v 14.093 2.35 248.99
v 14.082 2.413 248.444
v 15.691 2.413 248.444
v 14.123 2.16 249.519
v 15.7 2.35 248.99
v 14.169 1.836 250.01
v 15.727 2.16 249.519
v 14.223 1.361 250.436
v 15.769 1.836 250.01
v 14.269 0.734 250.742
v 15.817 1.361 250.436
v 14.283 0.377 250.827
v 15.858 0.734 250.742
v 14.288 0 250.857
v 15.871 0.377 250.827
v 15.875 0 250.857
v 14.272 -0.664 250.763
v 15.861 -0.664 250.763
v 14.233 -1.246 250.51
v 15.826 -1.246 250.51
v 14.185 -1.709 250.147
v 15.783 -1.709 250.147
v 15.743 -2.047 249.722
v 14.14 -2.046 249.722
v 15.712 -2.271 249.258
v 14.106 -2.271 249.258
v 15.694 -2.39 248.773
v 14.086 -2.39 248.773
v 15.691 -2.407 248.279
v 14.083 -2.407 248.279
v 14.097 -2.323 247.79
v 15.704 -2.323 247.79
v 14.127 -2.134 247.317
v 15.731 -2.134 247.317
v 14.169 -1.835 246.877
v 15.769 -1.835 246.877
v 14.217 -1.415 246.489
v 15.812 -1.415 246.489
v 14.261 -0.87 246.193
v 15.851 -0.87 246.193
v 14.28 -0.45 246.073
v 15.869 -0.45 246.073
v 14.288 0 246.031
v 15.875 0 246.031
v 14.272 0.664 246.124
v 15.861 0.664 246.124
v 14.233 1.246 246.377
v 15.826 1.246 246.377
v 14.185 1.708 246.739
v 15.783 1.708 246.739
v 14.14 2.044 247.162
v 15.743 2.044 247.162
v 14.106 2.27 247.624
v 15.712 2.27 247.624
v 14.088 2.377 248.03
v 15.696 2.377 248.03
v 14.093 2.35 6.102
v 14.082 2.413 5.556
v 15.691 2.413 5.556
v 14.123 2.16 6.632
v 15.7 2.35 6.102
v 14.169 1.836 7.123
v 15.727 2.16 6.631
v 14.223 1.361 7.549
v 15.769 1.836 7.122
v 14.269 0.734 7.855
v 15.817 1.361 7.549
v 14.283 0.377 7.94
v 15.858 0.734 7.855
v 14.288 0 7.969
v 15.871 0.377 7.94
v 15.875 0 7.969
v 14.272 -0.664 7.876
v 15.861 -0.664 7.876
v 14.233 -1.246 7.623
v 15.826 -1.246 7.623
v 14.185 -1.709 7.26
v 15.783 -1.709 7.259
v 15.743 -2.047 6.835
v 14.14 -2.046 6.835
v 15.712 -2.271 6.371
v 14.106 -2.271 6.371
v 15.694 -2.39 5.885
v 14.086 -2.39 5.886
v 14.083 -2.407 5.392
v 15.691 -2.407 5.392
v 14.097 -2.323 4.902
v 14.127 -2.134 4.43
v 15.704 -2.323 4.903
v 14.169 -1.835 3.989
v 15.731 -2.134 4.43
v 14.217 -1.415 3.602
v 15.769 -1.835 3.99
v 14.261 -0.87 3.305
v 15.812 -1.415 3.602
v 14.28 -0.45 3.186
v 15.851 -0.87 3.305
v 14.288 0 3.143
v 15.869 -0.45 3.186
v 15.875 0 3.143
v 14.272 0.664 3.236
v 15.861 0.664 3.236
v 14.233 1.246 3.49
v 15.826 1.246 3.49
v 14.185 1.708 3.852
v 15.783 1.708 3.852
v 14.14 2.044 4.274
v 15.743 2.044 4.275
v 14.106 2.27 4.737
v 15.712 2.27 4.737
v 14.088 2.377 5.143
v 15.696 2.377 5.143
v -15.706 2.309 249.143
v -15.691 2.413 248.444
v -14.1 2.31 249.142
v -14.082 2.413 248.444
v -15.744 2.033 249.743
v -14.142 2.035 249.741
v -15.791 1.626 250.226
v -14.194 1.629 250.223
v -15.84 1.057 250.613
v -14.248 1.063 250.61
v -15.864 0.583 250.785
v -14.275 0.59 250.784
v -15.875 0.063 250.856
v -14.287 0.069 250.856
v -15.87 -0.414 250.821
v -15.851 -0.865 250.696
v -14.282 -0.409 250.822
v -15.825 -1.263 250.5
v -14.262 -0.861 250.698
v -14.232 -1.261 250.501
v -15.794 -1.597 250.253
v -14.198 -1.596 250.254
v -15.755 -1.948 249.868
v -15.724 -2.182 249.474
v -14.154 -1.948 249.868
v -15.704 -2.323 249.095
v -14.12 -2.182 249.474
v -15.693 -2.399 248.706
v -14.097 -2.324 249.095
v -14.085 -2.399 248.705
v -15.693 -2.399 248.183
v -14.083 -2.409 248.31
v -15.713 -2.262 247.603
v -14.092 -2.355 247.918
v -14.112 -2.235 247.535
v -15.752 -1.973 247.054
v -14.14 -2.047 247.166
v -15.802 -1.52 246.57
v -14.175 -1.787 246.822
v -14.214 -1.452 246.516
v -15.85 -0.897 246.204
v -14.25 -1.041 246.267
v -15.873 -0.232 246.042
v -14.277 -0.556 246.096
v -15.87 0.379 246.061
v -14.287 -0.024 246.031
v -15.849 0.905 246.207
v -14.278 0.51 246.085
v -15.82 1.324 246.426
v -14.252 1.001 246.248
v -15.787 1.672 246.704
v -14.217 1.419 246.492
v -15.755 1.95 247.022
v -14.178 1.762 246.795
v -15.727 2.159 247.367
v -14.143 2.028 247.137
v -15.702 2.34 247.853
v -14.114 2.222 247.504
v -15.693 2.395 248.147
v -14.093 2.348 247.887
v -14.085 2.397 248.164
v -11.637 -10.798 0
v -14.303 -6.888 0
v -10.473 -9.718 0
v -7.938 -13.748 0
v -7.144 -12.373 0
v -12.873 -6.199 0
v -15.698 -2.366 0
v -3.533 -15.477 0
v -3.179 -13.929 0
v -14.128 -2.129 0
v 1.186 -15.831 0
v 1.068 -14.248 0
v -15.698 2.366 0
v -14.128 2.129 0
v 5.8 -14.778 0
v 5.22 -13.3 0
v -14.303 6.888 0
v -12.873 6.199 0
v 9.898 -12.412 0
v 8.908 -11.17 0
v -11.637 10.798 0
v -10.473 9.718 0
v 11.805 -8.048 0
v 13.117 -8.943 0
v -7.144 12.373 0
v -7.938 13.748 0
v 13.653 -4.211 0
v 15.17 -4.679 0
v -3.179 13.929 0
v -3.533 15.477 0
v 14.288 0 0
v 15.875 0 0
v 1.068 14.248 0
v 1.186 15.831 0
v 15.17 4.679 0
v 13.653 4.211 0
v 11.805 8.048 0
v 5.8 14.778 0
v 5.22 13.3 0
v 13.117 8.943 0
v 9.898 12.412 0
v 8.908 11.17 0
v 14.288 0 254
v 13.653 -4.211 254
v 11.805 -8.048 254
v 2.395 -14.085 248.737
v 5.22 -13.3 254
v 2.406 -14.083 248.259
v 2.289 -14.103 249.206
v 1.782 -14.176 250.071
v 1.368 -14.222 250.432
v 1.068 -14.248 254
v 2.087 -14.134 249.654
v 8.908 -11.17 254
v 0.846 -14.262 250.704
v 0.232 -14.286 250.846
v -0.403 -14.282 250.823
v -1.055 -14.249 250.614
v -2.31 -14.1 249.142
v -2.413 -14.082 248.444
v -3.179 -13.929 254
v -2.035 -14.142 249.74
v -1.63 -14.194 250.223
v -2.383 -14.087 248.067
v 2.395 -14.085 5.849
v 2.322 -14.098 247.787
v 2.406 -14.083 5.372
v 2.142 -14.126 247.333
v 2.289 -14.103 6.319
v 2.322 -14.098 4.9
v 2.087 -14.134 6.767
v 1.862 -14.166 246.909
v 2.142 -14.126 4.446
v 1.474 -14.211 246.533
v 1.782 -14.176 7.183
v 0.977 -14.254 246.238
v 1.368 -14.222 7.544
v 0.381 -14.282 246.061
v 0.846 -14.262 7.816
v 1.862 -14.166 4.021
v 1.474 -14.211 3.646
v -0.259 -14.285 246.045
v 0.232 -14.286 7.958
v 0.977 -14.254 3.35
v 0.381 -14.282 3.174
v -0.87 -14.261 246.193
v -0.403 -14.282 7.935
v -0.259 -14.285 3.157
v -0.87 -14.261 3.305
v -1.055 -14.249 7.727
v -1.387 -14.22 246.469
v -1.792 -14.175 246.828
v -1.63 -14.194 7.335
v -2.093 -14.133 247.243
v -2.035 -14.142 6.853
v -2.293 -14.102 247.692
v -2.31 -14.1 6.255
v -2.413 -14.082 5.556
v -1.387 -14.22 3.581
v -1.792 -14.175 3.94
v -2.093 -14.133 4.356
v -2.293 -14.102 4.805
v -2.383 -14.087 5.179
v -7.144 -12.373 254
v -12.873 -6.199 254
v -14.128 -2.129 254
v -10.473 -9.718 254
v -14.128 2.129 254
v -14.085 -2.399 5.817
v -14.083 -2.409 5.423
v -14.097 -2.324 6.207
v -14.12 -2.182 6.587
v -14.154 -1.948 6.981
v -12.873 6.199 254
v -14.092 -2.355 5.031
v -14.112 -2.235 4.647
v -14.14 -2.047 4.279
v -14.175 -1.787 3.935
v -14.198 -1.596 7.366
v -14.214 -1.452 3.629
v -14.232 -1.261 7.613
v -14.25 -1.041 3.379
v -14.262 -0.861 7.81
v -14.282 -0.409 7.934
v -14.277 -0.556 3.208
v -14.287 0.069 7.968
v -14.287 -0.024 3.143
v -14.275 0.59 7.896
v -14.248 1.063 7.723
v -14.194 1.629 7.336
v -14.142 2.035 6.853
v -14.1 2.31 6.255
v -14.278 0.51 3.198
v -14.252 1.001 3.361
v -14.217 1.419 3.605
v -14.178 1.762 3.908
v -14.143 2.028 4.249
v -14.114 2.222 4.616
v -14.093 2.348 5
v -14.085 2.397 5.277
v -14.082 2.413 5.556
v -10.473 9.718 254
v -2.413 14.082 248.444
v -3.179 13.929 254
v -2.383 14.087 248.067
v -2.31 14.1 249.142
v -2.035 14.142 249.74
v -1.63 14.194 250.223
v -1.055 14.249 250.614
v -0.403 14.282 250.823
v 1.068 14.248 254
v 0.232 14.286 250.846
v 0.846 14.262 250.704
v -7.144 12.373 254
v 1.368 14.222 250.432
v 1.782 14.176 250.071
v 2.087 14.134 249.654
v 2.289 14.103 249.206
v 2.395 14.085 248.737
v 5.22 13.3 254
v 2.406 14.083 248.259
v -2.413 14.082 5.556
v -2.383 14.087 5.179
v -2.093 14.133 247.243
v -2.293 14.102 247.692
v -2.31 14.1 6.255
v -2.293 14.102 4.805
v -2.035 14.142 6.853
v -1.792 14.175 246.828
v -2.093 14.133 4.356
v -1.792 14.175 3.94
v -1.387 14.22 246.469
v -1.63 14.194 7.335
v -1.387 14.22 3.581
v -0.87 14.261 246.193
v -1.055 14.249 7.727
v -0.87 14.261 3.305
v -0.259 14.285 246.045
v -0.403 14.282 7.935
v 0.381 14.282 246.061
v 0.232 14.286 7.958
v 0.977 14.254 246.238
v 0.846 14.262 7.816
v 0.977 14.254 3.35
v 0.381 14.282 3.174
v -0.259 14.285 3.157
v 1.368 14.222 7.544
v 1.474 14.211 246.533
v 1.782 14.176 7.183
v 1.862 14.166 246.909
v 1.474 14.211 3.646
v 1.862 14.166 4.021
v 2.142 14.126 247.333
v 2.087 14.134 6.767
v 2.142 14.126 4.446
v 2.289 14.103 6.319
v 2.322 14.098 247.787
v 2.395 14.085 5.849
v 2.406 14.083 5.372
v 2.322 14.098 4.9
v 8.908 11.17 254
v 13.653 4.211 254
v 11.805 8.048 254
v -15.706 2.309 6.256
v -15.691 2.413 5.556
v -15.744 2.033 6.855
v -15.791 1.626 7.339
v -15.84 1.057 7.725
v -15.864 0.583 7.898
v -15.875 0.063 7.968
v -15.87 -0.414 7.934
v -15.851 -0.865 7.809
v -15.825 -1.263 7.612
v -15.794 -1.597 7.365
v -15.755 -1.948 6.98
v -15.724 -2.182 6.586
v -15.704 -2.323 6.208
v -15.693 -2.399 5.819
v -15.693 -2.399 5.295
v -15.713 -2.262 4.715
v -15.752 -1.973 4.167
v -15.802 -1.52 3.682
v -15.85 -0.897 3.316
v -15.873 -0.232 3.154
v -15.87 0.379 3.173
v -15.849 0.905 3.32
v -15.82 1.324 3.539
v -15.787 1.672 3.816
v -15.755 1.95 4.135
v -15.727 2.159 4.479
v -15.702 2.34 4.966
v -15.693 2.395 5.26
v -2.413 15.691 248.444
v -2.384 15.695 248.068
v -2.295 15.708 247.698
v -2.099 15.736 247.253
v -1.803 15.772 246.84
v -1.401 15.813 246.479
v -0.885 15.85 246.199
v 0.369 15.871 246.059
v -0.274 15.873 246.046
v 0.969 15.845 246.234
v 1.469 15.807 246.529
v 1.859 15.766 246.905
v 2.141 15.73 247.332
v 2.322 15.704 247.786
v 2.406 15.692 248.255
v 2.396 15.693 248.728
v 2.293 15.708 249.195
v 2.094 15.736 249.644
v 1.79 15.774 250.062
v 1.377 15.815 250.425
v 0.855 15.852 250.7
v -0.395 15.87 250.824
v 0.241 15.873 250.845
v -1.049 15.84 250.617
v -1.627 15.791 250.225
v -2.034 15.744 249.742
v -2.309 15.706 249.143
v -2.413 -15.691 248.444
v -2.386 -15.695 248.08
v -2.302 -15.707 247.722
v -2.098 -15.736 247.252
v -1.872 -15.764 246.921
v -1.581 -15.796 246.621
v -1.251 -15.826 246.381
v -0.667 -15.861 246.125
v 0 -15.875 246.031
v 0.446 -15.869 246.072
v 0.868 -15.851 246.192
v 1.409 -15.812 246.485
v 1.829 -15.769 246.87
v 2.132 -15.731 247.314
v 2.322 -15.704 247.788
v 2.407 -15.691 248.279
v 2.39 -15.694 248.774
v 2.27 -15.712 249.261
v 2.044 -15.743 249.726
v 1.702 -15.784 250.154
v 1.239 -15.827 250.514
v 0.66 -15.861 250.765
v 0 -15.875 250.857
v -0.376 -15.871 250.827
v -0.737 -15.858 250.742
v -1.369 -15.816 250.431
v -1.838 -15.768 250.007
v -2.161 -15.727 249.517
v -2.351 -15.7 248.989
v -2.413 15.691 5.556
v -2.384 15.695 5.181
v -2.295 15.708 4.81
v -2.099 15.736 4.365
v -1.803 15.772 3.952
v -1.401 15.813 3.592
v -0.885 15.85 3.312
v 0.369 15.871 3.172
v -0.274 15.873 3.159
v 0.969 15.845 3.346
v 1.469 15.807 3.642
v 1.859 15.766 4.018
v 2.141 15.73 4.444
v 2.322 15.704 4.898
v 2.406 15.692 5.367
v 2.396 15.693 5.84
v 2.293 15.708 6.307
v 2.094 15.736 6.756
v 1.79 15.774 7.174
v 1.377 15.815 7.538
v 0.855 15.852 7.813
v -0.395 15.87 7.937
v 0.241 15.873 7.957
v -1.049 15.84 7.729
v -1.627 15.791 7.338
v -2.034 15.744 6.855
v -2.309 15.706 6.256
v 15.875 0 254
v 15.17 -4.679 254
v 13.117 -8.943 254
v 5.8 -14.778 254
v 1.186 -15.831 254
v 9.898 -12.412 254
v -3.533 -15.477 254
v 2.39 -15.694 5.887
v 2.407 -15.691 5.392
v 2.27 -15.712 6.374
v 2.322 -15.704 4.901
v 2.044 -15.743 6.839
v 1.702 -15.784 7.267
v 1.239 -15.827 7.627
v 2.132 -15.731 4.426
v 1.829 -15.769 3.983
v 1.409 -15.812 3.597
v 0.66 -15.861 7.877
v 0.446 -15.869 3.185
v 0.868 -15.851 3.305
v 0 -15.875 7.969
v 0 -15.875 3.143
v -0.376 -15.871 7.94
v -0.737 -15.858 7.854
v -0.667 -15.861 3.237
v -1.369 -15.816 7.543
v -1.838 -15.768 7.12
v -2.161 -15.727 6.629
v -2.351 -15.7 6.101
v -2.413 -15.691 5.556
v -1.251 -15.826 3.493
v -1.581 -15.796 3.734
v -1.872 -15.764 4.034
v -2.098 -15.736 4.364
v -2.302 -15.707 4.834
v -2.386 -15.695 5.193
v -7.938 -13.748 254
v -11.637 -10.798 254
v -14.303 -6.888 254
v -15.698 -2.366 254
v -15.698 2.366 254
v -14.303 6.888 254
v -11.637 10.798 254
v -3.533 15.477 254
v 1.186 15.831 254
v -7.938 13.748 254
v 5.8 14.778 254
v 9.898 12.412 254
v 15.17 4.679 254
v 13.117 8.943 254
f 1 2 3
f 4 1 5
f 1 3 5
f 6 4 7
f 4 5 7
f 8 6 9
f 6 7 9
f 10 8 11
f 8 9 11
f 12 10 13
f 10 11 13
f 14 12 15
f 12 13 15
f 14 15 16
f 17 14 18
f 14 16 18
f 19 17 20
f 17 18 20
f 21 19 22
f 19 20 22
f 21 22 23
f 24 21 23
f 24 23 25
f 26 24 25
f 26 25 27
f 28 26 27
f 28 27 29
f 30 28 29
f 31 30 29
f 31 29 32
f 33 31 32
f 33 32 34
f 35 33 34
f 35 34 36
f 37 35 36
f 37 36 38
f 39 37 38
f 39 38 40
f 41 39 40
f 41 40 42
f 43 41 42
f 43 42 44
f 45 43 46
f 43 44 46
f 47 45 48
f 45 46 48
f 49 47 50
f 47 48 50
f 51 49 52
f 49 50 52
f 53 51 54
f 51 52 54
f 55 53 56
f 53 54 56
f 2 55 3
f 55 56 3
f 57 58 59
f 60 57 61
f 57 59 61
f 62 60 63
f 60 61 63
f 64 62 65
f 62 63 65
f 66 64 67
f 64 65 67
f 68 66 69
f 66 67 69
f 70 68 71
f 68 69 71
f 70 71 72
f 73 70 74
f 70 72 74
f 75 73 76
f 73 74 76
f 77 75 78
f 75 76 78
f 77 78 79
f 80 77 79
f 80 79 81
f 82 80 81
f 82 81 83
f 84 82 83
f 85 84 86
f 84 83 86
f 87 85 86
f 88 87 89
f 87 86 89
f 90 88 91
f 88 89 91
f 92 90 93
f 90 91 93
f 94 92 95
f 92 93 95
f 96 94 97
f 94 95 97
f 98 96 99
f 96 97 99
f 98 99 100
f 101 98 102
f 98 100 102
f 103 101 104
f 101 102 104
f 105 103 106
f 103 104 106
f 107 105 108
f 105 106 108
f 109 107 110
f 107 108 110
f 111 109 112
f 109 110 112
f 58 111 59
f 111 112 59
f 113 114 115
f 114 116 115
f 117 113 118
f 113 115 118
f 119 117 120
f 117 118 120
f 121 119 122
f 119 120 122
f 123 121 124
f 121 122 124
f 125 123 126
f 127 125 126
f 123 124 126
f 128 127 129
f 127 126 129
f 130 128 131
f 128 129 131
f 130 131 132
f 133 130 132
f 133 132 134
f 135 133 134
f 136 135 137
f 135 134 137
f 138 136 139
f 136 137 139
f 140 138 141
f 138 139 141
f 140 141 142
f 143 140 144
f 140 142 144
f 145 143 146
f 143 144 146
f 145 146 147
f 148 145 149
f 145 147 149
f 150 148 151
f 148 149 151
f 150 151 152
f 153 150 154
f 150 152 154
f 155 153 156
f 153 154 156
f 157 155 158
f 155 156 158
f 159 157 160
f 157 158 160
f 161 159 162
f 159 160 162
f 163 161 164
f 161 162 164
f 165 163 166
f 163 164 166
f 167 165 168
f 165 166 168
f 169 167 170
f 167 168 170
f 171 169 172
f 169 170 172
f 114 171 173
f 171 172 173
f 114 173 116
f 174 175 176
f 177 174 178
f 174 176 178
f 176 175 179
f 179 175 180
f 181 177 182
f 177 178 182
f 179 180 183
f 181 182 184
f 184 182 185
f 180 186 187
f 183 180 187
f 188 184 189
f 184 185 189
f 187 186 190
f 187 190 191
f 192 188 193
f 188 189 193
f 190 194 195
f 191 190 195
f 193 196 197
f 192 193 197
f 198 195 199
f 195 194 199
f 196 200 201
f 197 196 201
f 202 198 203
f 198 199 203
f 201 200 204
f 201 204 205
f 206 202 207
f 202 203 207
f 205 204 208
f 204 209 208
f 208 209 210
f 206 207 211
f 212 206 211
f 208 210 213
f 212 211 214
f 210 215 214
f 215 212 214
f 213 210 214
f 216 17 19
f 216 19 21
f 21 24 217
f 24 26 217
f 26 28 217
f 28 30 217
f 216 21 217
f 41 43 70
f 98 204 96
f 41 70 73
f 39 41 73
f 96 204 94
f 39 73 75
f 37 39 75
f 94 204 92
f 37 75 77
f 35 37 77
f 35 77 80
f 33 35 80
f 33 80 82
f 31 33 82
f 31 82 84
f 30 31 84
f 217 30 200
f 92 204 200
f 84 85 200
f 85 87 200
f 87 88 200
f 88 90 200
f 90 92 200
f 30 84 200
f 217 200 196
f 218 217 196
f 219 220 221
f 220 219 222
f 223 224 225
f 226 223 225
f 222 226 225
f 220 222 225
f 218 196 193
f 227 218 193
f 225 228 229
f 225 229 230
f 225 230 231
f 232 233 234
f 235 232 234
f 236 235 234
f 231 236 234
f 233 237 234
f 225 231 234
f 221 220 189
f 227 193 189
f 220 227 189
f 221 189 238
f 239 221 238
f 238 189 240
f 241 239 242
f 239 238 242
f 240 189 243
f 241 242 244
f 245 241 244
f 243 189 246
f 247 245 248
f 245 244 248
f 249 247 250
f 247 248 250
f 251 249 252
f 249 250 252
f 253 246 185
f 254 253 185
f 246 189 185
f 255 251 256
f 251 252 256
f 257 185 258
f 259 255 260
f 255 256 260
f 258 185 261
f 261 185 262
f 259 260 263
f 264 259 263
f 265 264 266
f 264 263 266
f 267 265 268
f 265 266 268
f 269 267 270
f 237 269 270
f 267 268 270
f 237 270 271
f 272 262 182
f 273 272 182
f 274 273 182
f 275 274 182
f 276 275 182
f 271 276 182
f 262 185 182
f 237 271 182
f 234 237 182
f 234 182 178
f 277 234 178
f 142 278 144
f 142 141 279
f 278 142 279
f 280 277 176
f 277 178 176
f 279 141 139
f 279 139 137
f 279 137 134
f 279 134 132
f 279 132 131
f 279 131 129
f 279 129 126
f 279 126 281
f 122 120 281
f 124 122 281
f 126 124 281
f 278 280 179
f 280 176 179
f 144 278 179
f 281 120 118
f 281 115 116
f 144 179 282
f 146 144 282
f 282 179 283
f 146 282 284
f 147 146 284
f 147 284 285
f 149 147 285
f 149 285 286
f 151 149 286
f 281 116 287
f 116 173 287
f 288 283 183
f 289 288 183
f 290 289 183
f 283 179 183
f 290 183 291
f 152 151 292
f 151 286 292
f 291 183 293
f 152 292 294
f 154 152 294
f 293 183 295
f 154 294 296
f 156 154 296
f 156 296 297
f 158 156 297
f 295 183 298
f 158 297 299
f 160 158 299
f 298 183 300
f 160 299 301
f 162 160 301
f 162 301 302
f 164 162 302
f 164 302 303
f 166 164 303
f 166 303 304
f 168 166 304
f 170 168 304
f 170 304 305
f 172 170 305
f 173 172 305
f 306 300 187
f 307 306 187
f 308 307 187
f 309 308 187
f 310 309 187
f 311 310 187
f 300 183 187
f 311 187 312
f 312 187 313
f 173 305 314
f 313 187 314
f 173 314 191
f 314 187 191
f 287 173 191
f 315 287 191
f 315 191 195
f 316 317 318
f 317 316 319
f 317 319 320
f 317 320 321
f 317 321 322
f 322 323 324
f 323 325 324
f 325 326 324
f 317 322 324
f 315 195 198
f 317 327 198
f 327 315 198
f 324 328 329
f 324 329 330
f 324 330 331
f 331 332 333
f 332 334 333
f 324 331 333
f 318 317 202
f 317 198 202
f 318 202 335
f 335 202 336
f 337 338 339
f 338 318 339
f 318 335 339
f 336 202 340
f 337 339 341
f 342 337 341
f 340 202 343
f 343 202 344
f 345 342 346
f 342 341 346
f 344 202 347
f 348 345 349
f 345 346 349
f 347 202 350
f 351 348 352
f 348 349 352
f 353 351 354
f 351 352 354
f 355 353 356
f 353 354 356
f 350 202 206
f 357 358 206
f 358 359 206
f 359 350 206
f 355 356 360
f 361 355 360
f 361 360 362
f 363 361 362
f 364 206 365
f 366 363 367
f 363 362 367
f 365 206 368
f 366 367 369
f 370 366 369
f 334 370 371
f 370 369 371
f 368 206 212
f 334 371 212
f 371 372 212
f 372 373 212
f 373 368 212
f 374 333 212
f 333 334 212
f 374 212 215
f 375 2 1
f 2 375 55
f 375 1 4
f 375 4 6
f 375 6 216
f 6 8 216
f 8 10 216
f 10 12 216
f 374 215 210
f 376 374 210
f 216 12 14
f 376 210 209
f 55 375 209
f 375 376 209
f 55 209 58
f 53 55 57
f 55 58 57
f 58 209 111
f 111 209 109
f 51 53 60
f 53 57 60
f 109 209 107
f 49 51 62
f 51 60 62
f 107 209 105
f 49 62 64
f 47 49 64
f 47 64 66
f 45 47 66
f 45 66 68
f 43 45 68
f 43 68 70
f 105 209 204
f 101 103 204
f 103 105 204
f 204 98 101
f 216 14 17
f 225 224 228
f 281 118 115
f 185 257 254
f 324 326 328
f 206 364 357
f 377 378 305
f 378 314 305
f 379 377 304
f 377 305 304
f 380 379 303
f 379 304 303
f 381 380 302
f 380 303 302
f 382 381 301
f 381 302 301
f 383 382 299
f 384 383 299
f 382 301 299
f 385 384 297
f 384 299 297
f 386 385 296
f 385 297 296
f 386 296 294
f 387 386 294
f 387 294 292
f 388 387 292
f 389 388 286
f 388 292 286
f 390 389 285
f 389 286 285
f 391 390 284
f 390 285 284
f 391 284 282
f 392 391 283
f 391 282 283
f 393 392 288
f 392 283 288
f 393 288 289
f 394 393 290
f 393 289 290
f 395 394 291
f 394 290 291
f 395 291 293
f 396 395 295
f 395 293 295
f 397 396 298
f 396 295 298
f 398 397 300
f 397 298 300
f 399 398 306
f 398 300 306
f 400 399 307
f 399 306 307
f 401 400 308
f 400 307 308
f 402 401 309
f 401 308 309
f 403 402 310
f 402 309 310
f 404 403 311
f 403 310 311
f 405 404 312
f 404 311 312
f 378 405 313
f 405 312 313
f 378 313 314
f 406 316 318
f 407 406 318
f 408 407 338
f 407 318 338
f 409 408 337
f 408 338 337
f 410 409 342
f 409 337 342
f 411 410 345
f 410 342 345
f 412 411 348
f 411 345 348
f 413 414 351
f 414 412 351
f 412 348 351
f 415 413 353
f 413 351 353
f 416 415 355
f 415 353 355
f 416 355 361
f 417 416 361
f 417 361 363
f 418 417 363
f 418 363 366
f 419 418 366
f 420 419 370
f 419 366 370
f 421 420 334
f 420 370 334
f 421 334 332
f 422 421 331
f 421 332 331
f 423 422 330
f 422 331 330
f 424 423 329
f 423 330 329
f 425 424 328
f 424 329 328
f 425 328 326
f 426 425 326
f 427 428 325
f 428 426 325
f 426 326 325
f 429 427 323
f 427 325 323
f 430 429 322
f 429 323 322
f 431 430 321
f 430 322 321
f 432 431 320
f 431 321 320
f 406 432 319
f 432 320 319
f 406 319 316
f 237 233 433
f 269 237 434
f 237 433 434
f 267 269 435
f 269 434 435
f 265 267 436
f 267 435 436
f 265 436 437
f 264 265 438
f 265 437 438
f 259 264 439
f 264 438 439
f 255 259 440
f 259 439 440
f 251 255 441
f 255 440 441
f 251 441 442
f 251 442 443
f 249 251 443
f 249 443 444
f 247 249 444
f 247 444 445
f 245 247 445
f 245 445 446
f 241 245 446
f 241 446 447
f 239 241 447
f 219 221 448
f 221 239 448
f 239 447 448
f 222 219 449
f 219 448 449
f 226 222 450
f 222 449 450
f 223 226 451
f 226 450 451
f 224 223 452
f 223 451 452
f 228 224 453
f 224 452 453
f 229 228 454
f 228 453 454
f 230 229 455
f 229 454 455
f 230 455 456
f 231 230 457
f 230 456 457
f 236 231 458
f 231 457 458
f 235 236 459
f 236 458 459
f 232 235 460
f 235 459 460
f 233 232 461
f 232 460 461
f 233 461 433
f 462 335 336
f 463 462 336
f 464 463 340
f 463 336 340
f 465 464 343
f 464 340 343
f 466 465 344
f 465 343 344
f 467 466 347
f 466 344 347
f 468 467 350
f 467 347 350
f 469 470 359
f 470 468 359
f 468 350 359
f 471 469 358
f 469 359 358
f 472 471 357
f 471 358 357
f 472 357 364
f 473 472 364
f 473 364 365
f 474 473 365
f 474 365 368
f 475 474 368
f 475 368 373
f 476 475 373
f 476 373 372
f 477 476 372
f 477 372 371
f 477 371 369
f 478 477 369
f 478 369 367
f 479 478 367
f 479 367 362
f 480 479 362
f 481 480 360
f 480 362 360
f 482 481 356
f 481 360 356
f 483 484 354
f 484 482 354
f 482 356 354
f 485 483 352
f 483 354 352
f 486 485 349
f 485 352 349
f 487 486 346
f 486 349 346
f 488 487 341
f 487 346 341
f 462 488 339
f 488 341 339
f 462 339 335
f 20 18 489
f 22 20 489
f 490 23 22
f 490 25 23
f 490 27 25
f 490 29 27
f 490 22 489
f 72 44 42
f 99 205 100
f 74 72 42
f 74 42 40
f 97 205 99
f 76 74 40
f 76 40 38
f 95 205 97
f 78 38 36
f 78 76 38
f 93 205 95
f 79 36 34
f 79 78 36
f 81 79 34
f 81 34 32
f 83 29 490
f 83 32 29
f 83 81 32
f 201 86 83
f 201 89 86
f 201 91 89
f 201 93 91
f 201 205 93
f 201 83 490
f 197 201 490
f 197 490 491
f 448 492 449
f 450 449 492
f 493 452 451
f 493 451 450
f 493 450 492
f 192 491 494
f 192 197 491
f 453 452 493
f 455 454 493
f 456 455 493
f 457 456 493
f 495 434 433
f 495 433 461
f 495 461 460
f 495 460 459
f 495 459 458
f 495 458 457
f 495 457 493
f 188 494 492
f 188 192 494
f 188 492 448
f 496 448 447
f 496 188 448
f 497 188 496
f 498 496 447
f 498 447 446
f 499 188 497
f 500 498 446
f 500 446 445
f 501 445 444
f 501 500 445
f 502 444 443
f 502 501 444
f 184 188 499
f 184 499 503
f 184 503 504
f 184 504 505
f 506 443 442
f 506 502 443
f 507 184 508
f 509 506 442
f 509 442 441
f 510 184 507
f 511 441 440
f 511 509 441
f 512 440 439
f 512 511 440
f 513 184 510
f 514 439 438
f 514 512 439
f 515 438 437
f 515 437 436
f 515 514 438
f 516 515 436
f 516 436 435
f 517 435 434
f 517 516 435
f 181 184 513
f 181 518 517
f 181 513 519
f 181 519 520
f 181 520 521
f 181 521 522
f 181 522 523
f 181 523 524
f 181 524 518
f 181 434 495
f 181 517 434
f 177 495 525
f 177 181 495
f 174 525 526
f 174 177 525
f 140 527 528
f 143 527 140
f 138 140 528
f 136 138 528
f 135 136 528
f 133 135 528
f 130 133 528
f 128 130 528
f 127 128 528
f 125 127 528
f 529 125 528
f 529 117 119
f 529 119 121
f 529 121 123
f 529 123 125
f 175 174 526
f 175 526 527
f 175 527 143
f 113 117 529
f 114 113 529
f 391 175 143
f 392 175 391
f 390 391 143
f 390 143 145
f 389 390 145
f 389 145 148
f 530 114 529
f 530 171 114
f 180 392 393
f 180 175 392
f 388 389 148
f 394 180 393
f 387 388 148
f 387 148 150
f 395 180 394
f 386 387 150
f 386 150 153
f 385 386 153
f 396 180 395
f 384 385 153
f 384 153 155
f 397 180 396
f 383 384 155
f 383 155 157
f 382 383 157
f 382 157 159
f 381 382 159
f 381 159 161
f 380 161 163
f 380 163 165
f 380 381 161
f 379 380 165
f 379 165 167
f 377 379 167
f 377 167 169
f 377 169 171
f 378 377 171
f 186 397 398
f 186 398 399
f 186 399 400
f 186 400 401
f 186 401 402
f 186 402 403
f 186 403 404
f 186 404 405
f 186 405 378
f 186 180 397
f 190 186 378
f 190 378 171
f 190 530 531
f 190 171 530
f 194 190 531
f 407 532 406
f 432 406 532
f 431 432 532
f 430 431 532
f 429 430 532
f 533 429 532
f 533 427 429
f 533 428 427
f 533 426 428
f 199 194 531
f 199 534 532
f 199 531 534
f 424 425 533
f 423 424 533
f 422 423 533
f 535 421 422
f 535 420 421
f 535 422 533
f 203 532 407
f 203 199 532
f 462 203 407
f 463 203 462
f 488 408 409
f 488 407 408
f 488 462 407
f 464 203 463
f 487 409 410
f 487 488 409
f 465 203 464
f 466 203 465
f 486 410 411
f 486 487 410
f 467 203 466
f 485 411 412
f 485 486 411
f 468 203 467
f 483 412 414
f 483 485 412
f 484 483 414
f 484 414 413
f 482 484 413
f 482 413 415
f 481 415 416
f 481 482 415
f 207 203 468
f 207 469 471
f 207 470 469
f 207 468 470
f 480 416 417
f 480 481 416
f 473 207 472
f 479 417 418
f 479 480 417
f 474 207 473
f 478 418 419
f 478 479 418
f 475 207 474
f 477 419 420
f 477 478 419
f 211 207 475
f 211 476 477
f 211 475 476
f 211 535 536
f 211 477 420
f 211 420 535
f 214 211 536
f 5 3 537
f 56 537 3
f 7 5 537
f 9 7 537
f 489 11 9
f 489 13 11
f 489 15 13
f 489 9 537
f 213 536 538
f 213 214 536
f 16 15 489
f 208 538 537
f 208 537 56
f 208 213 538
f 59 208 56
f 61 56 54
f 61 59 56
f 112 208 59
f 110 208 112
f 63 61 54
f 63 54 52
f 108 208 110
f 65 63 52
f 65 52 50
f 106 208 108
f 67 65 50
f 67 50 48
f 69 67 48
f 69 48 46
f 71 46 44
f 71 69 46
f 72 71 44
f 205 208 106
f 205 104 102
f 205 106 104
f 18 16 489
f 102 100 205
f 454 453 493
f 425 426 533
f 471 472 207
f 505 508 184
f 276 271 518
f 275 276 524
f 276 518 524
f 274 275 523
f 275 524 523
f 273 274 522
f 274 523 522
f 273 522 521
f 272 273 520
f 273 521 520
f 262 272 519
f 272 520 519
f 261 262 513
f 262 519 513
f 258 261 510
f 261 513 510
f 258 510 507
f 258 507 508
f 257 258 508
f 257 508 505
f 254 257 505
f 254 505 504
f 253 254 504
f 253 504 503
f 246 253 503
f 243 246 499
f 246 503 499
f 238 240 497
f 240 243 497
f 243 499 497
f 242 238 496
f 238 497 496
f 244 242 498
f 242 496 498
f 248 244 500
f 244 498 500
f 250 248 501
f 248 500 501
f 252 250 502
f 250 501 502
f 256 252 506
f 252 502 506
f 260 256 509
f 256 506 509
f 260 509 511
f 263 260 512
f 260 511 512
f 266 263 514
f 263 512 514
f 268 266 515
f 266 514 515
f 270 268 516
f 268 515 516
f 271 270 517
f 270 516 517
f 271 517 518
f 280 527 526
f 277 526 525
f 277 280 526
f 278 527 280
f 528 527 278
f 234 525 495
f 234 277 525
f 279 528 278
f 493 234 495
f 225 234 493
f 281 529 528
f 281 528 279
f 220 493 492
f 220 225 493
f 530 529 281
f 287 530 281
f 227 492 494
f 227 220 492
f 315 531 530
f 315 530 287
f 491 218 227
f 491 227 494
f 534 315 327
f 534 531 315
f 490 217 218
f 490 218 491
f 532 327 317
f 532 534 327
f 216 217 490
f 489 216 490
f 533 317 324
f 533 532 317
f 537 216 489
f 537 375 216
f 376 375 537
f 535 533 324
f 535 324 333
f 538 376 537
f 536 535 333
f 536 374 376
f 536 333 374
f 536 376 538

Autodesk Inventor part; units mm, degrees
ref_plane "XY Plane" through (0, 0, 0) normal (0, 0, 1) x (1, 0, 0)
sketch "Sketch1" plane through (0, 0, 0) normal (0, 0, 1) x (1, 0, 0)
  circle A0 centre (0, 0) radius 15.875
  circle A1 centre (0, 0) radius 14.2875
  dimension "d0" = 31.75
  dimension "d1" = 28.575
extrude "Extrusion1" add sketch "Sketch1" along normal blind 254
ref_plane "Work Plane1" through (0, -15.875, 0) normal (0, 1, 0) x (-1, 0, 0)
sketch "Sketch2" plane through (0, -15.875, 0) normal (0, 1, 0) x (-1, 0, 0)
  line L0 (15.875, 254) -> (-15.875, 254) projected
  line L1 (-15.875, 0) -> (15.875, 0) projected
  line L2 (18.6459, 127) -> (-13.1041, 127) construction
  line L3 (15.875, 0) -> (15.875, 254) construction
  line L4 (-15.875, 0) -> (-15.875, 254) construction
  circle A0 centre (0, 5.5563) radius 2.413
  circle A1 centre (0, 248.4437) radius 2.413
  point P0 (0, 0)
  dimension "d4" = 127
  dimension "d5" = 4.826
  dimension "d6" = 5.5563
  dimension "d7" = 15.875
extrude "Extrusion2" cut sketch "Sketch2" along normal blind 50.8
ref_plane "Work Plane2" through (15.875, 0, 0) normal (1, 0, 0) x (0, 1, 0)
sketch "Sketch3" plane through (15.875, 0, 0) normal (1, 0, 0) x (0, 1, 0)
  line L0 (-15.875, 0) -> (15.875, 0) projected
  line L1 (15.875, 0) -> (15.875, 254) projected
  line L2 (-15.875, 0) -> (-15.875, 254) projected
  line L3 (15.875, 254) -> (-15.875, 254) projected
  line L4 (15.875, 127) -> (-15.875, 127) construction
  circle A0 centre (0, 5.5563) radius 2.413
  circle A1 centre (0, 248.4437) radius 2.413
  point P0 (0, 0)
  dimension "d10" = 127
  dimension "d11" = 4.826
  dimension "d12" = 5.5563
  dimension "d13" = 15.875
extrude "Extrusion3" cut sketch "Sketch3" against normal blind 50.8 contours A0 | A1
equation "\"d4\" = 0.5 * d2"
equation "\"d10\" = 0.5 * d2"
equation "\"d2\" = 254"
properties part number "Polycarbonate Roller 1.25 OD 1.125 ID (8585K63)" material "Polycarbonate, Clear"
